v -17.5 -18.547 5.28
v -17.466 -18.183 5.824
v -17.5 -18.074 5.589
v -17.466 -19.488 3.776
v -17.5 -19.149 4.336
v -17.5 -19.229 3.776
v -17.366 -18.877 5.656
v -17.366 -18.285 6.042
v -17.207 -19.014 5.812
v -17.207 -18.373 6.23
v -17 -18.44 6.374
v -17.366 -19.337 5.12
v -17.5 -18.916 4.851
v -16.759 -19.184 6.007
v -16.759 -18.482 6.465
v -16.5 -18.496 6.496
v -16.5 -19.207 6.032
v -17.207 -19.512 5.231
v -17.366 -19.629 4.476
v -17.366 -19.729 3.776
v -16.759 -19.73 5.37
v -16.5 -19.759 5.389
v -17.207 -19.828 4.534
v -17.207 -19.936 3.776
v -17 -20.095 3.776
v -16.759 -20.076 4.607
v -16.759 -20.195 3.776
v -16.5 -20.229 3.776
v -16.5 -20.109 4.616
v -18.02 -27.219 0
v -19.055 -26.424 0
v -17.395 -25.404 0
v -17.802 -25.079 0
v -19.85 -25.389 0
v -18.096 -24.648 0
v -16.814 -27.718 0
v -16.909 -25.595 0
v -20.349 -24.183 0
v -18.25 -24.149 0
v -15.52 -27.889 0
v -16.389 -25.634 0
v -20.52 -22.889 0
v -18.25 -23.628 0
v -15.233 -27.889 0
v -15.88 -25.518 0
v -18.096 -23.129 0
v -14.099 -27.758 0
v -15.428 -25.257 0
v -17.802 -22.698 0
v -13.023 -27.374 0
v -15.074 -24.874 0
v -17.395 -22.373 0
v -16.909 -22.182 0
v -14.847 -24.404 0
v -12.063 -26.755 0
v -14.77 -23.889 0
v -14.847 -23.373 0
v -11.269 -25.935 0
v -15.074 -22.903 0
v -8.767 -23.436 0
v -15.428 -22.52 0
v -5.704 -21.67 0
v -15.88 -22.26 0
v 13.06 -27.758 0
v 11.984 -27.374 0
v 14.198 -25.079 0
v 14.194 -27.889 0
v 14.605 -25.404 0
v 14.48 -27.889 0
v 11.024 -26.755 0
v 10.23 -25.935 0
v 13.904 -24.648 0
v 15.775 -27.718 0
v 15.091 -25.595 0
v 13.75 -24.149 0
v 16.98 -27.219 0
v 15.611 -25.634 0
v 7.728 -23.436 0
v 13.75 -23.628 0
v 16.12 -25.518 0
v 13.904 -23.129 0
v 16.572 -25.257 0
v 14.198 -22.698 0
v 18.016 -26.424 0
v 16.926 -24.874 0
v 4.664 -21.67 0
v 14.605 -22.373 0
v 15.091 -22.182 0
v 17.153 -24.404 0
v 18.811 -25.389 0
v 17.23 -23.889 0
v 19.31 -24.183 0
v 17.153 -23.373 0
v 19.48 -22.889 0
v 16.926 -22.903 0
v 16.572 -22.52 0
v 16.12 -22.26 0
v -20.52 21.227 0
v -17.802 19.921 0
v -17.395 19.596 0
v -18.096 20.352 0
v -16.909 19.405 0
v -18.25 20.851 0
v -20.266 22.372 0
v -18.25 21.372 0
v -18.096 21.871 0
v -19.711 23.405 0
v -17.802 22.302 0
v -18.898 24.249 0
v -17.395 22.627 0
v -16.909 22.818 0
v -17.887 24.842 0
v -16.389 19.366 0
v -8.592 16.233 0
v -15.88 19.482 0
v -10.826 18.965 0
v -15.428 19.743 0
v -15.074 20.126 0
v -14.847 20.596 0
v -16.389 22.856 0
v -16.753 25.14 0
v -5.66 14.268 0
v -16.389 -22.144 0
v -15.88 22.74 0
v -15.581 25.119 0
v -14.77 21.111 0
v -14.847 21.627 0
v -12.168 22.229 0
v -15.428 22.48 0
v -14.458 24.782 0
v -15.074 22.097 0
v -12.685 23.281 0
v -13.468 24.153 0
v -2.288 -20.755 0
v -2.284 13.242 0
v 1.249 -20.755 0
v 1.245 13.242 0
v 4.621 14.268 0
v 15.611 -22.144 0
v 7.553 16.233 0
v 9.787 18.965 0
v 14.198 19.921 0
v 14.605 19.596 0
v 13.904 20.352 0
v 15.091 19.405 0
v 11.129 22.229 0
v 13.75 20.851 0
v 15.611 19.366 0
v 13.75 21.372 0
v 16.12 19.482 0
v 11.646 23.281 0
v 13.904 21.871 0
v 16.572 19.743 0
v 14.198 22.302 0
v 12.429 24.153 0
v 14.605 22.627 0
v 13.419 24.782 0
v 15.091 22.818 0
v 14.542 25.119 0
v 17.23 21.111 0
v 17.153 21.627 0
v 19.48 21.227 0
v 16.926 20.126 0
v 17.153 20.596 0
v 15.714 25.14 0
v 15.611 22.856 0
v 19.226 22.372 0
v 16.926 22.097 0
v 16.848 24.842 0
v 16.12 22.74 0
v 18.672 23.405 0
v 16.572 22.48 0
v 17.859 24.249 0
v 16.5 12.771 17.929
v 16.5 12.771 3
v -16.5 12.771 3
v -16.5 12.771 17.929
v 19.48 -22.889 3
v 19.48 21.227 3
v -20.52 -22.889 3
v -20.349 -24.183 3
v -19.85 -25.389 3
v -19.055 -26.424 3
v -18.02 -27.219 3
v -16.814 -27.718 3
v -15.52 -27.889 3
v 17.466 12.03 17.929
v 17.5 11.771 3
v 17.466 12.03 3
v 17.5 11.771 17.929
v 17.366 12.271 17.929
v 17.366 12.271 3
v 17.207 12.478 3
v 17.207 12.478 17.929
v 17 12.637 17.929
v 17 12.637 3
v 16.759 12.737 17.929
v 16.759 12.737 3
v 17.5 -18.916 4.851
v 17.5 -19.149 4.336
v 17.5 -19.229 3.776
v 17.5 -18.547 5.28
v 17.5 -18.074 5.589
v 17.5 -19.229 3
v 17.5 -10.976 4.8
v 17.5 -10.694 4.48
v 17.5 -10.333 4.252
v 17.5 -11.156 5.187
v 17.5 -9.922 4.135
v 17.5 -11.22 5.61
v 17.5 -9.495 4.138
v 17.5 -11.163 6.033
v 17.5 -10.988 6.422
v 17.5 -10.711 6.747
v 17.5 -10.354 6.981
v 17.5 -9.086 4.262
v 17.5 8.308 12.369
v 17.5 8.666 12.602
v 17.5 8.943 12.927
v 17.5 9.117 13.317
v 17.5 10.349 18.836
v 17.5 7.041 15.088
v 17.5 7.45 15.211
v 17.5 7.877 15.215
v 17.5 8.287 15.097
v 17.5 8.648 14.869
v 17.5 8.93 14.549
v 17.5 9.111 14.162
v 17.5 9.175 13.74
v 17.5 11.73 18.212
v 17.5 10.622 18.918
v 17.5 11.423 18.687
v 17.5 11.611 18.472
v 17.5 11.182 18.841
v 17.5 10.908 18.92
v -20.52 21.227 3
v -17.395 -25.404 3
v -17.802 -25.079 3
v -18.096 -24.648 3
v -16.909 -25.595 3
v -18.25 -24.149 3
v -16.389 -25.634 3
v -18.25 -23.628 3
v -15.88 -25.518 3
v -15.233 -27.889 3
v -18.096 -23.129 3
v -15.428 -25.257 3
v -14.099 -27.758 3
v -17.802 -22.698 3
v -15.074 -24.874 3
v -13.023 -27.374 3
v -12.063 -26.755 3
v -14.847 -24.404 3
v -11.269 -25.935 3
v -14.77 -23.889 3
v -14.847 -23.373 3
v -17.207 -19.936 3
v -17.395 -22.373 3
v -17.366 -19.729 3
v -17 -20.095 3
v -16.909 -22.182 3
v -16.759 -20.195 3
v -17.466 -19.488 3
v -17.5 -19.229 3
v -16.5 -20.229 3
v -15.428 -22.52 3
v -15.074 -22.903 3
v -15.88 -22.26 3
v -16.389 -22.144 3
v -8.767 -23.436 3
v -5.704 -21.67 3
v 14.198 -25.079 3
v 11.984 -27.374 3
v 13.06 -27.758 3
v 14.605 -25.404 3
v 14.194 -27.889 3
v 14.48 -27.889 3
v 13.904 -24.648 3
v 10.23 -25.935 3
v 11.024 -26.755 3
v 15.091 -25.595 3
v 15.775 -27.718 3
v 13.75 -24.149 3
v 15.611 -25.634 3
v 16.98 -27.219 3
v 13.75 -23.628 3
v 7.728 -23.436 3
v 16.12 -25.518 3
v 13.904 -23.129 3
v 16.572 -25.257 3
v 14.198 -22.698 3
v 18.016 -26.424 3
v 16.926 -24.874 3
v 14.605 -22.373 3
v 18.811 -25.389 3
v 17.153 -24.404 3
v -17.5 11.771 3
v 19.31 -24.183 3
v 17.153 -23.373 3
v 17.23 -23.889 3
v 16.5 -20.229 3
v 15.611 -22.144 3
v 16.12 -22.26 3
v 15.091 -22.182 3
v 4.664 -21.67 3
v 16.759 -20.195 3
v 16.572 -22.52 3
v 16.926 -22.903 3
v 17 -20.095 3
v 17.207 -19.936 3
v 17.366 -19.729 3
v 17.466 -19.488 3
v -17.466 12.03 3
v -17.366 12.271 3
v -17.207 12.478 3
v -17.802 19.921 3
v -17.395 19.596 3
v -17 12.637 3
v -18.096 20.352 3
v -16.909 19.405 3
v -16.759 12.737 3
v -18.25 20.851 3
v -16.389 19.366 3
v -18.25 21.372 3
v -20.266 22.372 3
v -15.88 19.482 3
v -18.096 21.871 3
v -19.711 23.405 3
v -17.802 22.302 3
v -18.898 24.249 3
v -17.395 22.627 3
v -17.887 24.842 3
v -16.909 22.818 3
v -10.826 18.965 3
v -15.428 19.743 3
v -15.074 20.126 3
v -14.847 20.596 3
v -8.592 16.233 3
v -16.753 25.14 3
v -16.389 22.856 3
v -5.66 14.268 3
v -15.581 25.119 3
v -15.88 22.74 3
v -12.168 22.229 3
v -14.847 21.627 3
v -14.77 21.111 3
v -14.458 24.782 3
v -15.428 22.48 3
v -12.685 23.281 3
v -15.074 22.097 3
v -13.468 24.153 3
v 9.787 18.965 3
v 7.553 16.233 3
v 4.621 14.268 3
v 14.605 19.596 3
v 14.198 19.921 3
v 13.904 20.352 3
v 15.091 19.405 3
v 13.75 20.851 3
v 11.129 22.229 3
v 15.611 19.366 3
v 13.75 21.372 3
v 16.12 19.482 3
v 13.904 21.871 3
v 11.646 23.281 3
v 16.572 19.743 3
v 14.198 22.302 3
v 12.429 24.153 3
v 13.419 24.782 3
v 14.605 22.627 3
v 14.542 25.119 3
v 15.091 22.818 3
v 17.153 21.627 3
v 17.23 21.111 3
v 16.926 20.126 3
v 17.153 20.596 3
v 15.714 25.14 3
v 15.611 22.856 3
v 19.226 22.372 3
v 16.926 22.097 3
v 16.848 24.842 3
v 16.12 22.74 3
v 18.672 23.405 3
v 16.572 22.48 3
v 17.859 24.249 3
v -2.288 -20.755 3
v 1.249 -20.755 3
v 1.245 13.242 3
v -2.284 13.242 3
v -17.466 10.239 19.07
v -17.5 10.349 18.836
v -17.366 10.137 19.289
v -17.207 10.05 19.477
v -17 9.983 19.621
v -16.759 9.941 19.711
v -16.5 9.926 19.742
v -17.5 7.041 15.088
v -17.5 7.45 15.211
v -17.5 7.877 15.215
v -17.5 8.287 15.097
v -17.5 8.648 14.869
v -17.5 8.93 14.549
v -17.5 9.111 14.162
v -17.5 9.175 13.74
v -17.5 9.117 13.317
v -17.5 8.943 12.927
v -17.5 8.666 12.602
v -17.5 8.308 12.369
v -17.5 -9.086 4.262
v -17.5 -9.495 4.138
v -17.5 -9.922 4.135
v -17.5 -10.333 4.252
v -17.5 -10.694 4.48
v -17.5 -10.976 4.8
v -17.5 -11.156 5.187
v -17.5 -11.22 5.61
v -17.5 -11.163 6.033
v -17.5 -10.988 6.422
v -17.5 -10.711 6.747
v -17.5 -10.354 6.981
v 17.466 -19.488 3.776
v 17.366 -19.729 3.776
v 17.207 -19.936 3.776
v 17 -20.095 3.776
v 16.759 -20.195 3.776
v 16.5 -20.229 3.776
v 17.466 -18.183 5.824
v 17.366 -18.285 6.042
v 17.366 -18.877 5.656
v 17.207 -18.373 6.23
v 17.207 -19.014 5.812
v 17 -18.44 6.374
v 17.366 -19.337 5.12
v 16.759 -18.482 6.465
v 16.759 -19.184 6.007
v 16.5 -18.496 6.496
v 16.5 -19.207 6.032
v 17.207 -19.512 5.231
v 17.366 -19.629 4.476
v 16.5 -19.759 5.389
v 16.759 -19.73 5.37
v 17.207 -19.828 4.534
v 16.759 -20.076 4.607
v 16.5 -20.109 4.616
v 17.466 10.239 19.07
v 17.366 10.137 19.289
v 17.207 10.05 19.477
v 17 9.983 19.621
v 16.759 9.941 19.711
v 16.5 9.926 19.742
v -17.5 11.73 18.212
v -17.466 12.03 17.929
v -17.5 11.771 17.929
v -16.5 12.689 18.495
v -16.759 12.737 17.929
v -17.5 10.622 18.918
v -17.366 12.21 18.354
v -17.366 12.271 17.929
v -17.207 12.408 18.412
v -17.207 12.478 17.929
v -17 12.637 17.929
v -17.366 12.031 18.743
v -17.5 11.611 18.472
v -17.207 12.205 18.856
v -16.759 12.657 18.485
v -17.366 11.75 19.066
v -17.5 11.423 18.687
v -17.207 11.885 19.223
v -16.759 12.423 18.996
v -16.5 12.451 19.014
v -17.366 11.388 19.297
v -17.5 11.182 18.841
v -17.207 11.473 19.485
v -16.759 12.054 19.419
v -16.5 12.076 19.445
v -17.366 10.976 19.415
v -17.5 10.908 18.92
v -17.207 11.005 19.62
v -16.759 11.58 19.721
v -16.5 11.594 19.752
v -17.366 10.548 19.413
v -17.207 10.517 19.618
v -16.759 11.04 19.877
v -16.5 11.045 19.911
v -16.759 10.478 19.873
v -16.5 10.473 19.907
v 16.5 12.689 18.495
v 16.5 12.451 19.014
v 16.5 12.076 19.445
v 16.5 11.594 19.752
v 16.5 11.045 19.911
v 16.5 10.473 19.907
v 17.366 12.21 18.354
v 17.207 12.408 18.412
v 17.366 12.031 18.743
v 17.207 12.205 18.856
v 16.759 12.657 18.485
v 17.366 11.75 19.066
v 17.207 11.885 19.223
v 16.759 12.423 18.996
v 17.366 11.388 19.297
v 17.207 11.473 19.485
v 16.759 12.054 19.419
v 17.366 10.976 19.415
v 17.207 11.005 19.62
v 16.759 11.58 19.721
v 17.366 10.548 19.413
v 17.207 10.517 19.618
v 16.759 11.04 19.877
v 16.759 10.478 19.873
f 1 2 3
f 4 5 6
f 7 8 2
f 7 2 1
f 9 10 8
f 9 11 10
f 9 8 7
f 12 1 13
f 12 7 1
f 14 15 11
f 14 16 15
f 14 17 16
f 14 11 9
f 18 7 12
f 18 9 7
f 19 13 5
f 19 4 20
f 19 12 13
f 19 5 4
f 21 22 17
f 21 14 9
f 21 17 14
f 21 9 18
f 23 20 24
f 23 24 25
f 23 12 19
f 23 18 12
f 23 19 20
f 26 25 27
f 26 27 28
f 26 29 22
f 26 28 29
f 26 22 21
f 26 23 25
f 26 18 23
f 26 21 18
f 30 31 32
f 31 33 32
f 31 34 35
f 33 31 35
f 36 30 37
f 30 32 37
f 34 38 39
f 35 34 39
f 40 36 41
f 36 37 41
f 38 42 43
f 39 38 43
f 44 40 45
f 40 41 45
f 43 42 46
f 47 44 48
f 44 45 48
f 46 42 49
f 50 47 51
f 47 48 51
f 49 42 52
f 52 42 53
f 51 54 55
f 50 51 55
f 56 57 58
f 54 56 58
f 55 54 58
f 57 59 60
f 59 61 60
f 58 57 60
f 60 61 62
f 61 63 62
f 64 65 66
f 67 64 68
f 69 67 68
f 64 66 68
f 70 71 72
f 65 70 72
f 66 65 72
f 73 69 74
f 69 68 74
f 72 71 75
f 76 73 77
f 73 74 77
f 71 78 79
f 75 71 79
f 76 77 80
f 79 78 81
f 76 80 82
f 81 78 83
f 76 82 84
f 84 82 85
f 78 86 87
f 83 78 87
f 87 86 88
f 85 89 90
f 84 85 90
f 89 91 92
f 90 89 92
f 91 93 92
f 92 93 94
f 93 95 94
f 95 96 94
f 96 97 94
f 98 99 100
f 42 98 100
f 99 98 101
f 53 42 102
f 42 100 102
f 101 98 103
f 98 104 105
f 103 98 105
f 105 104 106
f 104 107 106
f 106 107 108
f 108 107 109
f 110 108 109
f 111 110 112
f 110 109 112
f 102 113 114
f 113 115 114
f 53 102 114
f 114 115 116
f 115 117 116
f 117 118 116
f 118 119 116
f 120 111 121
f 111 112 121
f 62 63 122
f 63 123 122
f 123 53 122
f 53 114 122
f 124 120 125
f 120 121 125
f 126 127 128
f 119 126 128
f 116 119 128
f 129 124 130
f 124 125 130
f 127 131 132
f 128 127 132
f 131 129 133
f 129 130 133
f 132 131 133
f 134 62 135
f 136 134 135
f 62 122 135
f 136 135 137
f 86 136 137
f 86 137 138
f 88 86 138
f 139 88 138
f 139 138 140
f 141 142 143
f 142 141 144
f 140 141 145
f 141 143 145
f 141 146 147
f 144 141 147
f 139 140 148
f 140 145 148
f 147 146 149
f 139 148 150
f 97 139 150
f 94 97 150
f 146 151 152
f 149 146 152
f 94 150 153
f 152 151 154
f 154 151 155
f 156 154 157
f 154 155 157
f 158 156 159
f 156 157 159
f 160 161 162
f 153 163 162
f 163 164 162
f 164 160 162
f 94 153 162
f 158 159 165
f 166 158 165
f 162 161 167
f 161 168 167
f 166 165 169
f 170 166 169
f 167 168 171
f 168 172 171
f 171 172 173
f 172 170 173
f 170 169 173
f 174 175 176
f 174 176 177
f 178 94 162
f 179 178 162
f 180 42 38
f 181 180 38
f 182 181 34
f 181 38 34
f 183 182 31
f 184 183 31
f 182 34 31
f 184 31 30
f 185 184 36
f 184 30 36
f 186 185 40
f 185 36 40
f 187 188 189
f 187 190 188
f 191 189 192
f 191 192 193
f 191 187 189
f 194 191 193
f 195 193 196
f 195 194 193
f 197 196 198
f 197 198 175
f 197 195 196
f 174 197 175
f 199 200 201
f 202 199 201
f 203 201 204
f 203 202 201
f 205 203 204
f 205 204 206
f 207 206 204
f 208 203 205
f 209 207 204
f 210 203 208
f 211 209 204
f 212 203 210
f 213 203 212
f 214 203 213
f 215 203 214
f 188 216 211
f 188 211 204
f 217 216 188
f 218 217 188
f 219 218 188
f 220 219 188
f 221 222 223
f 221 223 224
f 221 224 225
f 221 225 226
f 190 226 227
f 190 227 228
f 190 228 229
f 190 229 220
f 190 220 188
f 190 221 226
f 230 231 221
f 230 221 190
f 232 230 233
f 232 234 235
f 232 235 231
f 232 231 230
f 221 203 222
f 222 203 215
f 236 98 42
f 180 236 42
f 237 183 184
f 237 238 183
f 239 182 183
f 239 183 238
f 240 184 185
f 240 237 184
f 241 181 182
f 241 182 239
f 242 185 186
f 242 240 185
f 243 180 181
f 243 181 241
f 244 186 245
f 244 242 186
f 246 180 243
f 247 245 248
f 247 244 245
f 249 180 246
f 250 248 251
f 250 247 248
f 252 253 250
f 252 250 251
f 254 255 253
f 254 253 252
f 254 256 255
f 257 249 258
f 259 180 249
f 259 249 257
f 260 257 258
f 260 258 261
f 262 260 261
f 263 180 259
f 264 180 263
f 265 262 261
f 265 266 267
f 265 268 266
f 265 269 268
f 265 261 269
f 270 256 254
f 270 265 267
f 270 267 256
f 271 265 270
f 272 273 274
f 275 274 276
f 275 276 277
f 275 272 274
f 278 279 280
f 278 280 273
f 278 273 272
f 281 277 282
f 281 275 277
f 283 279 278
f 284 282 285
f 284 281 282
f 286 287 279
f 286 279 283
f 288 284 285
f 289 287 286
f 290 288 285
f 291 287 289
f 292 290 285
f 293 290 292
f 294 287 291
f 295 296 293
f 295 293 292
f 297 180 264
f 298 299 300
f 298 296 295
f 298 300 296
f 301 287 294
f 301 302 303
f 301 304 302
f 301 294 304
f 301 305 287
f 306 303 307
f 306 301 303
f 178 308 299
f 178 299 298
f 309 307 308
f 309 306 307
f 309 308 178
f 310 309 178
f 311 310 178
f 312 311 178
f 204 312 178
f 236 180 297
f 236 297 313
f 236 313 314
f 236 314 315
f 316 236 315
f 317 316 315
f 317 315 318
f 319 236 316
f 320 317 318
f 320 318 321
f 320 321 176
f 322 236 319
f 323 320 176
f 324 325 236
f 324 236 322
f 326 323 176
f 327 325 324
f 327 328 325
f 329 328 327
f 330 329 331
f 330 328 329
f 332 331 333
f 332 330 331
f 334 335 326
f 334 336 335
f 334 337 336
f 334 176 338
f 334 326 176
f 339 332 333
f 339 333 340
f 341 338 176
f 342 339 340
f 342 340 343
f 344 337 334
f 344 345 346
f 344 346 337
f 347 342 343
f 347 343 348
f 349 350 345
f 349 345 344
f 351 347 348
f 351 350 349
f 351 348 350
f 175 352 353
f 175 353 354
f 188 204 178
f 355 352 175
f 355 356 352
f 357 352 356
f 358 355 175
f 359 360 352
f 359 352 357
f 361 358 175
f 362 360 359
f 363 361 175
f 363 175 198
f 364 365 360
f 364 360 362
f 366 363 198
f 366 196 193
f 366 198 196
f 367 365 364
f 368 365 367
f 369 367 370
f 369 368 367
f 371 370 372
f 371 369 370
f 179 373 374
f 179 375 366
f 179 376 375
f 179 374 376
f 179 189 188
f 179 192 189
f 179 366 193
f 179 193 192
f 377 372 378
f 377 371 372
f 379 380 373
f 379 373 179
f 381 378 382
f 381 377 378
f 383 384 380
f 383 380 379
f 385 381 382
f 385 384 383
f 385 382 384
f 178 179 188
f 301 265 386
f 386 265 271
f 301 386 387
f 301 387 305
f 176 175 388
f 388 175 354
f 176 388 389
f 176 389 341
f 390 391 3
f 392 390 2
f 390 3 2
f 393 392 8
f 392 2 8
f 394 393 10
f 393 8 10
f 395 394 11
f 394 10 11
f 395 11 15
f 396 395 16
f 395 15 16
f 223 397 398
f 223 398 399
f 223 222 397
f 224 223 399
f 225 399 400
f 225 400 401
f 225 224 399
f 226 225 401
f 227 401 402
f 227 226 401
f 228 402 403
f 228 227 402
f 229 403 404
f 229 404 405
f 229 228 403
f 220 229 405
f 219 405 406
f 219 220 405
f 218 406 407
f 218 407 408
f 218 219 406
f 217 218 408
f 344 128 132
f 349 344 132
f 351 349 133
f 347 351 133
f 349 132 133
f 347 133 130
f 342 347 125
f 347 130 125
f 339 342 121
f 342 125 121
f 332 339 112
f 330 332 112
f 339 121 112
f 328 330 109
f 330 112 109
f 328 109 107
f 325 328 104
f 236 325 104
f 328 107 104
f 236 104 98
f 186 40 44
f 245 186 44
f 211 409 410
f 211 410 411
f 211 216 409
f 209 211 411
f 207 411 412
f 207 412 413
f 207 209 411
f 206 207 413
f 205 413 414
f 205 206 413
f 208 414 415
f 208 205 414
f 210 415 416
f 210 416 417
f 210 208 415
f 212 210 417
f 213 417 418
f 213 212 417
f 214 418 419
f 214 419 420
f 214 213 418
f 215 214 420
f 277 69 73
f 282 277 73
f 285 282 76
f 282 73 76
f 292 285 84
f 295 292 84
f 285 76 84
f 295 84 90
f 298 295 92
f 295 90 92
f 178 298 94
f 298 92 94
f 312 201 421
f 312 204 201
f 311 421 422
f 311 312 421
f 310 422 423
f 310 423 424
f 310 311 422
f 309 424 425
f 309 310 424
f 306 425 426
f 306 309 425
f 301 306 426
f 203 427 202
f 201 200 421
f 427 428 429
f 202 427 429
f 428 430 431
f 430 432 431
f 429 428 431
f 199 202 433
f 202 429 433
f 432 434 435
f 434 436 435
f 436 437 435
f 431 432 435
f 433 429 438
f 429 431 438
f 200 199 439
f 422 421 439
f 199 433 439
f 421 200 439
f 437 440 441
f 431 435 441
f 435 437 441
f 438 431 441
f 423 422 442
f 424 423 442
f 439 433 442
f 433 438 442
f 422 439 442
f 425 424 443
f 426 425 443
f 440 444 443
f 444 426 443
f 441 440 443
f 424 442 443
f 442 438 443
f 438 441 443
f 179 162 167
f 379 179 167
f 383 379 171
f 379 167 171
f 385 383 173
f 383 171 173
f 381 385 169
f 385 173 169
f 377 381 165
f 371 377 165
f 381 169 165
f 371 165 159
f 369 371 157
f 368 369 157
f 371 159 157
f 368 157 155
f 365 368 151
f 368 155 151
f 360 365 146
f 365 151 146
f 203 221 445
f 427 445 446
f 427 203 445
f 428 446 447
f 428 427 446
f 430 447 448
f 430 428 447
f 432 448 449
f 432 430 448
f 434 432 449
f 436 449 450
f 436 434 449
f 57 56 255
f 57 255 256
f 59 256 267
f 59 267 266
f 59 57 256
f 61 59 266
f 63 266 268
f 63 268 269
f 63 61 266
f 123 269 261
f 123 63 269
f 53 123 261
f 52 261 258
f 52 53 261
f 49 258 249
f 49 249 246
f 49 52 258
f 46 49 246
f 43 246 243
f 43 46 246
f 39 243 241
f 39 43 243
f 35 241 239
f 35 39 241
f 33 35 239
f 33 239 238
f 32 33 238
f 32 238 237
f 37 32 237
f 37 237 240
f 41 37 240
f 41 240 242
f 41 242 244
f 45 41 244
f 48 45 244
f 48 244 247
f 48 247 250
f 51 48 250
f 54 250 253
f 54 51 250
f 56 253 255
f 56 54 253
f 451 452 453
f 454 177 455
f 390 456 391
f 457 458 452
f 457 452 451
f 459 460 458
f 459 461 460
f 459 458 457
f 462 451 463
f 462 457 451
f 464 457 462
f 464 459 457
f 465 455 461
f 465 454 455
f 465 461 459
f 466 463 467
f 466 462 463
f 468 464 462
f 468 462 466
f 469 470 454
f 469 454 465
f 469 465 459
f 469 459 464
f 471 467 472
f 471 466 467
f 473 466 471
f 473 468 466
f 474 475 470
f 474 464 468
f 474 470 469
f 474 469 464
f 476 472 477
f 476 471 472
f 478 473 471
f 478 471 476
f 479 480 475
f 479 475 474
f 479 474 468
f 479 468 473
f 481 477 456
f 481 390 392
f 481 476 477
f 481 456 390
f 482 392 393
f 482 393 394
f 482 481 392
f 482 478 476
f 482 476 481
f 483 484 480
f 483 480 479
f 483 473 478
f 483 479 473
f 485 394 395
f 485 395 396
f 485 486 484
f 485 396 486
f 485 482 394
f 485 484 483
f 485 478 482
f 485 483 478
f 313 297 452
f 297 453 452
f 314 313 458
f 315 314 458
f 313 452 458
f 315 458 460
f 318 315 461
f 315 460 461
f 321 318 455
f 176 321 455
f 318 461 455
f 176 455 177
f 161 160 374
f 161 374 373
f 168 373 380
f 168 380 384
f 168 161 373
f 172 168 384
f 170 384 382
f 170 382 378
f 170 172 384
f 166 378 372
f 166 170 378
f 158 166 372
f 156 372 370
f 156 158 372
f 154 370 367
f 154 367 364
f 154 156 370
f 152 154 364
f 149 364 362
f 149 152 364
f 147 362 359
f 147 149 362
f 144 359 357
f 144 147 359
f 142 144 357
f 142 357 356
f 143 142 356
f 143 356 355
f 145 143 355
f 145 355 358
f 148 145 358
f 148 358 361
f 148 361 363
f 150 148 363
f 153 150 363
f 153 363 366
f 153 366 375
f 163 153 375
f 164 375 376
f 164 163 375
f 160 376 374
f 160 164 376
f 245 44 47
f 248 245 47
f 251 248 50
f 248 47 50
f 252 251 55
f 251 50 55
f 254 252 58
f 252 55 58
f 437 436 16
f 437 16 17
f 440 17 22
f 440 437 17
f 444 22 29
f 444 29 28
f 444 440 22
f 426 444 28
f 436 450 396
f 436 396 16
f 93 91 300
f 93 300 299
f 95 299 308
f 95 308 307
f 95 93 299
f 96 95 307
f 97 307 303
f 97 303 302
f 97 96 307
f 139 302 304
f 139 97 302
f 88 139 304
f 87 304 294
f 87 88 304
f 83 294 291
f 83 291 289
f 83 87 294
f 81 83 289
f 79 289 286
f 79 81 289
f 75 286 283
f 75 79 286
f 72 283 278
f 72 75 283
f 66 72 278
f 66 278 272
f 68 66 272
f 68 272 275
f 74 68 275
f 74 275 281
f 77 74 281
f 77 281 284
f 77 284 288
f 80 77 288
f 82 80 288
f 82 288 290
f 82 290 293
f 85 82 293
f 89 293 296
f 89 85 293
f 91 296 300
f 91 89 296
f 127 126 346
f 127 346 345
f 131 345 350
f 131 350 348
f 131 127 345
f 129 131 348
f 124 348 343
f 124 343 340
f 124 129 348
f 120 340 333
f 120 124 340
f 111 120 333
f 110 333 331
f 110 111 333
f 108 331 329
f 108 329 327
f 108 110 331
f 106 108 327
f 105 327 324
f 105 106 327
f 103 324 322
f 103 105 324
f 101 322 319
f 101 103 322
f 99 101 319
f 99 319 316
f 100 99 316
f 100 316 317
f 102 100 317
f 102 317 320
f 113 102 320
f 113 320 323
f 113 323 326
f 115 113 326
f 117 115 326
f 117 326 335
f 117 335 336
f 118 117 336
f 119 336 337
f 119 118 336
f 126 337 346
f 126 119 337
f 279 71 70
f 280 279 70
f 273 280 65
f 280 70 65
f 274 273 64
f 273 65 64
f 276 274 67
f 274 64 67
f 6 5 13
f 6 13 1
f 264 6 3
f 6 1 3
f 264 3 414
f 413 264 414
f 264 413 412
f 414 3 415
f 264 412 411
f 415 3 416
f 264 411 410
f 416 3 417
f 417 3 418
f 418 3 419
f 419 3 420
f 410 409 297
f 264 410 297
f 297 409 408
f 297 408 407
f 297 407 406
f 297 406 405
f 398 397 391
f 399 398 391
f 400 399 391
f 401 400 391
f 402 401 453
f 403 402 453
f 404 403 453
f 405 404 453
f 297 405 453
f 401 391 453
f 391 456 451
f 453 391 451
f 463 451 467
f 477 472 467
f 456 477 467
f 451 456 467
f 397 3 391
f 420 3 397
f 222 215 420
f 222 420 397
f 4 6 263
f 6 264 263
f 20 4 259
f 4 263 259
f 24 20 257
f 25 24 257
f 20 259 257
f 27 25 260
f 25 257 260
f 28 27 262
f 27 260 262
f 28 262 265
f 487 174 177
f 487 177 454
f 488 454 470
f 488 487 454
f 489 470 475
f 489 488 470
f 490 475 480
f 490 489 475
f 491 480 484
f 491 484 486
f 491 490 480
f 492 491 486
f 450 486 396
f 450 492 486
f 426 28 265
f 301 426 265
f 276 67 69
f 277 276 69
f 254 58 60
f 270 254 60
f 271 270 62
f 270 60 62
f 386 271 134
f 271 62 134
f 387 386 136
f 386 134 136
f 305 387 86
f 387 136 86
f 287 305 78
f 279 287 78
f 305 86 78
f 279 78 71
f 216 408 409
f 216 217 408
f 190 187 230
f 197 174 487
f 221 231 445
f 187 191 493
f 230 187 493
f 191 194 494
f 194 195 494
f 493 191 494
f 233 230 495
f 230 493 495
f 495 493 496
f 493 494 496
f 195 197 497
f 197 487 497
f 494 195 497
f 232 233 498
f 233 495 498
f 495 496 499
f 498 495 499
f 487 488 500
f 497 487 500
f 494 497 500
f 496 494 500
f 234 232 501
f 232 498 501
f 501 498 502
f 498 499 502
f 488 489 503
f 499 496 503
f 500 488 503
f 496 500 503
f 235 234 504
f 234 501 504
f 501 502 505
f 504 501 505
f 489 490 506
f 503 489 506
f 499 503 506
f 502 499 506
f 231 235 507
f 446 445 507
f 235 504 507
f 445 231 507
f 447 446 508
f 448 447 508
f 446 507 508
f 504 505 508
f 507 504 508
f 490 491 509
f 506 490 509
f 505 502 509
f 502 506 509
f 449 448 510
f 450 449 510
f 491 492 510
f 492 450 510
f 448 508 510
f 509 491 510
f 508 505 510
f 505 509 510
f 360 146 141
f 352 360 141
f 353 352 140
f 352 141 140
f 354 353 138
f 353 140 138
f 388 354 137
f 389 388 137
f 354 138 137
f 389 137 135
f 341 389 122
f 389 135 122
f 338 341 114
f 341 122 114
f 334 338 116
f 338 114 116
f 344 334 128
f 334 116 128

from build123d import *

# Parameters (mm, degrees)
F0_R     = 1.75
F1_DEPTH = 3
F3_DEPTH = 17.5
F4_R     = 1


with BuildPart() as f1:
    # F0 (on Top) → F1 (new body)
    with BuildSketch(Plane.XY):
        with BuildLine():
            ThreePointArc((-20.5195807586, -22.8886182085), (-19.0551146645, -26.4241521144), (-15.5195807586, -27.8886182085))
            Line((-15.5195807586, -27.8886182085), (-15.2333166803, -27.8886182085))
            ThreePointArc((-15.2333166803, -27.8886182085), (-13.0234939097, -27.3737807832), (-11.2687509252, -25.9352915373))
            ThreePointArc((-11.2687509252, -25.9352915373), (-0.5195807586, -20.639215731), (10.229589408, -25.9352915373))
            ThreePointArc((10.229589408, -25.9352915373), (11.9843323925, -27.3737807832), (14.1941551632, -27.8886182085))
            Line((14.1941551632, -27.8886182085), (14.4804192414, -27.8886182085))
            ThreePointArc((14.4804192414, -27.8886182085), (18.0159531473, -26.4241521144), (19.4804192414, -22.8886182085))
            Line((19.4804192414, -22.8886182085), (19.4804192414, 21.2272368371))
            ThreePointArc((19.4804192414, 21.2272368371), (15.7137853447, 25.1397413301), (11.1289973993, 22.2285659978))
            ThreePointArc((11.1289973993, 22.2285659978), (-0.5195807586, 13.1113817915), (-12.1681589164, 22.2285659978))
            ThreePointArc((-12.1681589164, 22.2285659978), (-16.7529468618, 25.1397413301), (-20.5195807586, 21.2272368371))
            Line((-20.5195807586, 21.2272368371), (-20.5195807586, -22.8886182085))
        make_face()
        with Locations((-16.5195807586, -23.8886182085)):
            Circle(F0_R, mode=Mode.SUBTRACT)
        with Locations((15.4804192414, -23.8886182085)):
            Circle(F0_R, mode=Mode.SUBTRACT)
        with Locations((-16.5195807586, 21.1113817915)):
            Circle(F0_R, mode=Mode.SUBTRACT)
        with Locations((15.4804192414, 21.1113817915)):
            Circle(F0_R, mode=Mode.SUBTRACT)
    extrude(amount=F1_DEPTH)

    # F2 (on Right) → F3 (join, symmetric)
    with BuildSketch(Plane.YZ):
        with BuildLine():
            Line((-20.2289633453, 3.7764561929), (-20.2289633453, 2.6880949736))
            Line((-20.2289633453, 2.6880949736), (12.7710366547, 2.6880949736))
            Line((12.7710366547, 2.6880949736), (12.7710366547, 17.9294266955))
            ThreePointArc((12.7710366547, 17.9294266955), (11.845807029, 19.6161005355), (9.9261680122, 19.7422137699))
            Line((9.9261680122, 19.7422137699), (-18.4962663091, 6.4956368044))
            ThreePointArc((-18.4962663091, 6.4956368044), (-19.7589741053, 5.3886117543), (-20.2289633453, 3.7764561929))
        make_face()
        with BuildLine():
            Line((-10.3537236473, 6.9807345733), (7.0411683064, 15.0878084597))
            ThreePointArc((7.0411683064, 15.0878084597), (9.0344100941, 14.3618696358), (8.3084712702, 12.3686278481))
            Line((8.3084712702, 12.3686278481), (-9.0864206835, 4.2615539618))
            ThreePointArc((-9.0864206835, 4.2615539618), (-11.0796624712, 4.9874927857), (-10.3537236473, 6.9807345733))
        make_face(mode=Mode.SUBTRACT)
    extrude(amount=F3_DEPTH, both=True)

    # F4
    f4_edges = [f1.edges().sort_by_distance(p)[0] for p in [
        (17.5, -4.285049, 13.118925),
        (-17.5, -4.285049, 13.118925),
    ]]
    fillet(f4_edges, radius=F4_R)


solid = f1.part
